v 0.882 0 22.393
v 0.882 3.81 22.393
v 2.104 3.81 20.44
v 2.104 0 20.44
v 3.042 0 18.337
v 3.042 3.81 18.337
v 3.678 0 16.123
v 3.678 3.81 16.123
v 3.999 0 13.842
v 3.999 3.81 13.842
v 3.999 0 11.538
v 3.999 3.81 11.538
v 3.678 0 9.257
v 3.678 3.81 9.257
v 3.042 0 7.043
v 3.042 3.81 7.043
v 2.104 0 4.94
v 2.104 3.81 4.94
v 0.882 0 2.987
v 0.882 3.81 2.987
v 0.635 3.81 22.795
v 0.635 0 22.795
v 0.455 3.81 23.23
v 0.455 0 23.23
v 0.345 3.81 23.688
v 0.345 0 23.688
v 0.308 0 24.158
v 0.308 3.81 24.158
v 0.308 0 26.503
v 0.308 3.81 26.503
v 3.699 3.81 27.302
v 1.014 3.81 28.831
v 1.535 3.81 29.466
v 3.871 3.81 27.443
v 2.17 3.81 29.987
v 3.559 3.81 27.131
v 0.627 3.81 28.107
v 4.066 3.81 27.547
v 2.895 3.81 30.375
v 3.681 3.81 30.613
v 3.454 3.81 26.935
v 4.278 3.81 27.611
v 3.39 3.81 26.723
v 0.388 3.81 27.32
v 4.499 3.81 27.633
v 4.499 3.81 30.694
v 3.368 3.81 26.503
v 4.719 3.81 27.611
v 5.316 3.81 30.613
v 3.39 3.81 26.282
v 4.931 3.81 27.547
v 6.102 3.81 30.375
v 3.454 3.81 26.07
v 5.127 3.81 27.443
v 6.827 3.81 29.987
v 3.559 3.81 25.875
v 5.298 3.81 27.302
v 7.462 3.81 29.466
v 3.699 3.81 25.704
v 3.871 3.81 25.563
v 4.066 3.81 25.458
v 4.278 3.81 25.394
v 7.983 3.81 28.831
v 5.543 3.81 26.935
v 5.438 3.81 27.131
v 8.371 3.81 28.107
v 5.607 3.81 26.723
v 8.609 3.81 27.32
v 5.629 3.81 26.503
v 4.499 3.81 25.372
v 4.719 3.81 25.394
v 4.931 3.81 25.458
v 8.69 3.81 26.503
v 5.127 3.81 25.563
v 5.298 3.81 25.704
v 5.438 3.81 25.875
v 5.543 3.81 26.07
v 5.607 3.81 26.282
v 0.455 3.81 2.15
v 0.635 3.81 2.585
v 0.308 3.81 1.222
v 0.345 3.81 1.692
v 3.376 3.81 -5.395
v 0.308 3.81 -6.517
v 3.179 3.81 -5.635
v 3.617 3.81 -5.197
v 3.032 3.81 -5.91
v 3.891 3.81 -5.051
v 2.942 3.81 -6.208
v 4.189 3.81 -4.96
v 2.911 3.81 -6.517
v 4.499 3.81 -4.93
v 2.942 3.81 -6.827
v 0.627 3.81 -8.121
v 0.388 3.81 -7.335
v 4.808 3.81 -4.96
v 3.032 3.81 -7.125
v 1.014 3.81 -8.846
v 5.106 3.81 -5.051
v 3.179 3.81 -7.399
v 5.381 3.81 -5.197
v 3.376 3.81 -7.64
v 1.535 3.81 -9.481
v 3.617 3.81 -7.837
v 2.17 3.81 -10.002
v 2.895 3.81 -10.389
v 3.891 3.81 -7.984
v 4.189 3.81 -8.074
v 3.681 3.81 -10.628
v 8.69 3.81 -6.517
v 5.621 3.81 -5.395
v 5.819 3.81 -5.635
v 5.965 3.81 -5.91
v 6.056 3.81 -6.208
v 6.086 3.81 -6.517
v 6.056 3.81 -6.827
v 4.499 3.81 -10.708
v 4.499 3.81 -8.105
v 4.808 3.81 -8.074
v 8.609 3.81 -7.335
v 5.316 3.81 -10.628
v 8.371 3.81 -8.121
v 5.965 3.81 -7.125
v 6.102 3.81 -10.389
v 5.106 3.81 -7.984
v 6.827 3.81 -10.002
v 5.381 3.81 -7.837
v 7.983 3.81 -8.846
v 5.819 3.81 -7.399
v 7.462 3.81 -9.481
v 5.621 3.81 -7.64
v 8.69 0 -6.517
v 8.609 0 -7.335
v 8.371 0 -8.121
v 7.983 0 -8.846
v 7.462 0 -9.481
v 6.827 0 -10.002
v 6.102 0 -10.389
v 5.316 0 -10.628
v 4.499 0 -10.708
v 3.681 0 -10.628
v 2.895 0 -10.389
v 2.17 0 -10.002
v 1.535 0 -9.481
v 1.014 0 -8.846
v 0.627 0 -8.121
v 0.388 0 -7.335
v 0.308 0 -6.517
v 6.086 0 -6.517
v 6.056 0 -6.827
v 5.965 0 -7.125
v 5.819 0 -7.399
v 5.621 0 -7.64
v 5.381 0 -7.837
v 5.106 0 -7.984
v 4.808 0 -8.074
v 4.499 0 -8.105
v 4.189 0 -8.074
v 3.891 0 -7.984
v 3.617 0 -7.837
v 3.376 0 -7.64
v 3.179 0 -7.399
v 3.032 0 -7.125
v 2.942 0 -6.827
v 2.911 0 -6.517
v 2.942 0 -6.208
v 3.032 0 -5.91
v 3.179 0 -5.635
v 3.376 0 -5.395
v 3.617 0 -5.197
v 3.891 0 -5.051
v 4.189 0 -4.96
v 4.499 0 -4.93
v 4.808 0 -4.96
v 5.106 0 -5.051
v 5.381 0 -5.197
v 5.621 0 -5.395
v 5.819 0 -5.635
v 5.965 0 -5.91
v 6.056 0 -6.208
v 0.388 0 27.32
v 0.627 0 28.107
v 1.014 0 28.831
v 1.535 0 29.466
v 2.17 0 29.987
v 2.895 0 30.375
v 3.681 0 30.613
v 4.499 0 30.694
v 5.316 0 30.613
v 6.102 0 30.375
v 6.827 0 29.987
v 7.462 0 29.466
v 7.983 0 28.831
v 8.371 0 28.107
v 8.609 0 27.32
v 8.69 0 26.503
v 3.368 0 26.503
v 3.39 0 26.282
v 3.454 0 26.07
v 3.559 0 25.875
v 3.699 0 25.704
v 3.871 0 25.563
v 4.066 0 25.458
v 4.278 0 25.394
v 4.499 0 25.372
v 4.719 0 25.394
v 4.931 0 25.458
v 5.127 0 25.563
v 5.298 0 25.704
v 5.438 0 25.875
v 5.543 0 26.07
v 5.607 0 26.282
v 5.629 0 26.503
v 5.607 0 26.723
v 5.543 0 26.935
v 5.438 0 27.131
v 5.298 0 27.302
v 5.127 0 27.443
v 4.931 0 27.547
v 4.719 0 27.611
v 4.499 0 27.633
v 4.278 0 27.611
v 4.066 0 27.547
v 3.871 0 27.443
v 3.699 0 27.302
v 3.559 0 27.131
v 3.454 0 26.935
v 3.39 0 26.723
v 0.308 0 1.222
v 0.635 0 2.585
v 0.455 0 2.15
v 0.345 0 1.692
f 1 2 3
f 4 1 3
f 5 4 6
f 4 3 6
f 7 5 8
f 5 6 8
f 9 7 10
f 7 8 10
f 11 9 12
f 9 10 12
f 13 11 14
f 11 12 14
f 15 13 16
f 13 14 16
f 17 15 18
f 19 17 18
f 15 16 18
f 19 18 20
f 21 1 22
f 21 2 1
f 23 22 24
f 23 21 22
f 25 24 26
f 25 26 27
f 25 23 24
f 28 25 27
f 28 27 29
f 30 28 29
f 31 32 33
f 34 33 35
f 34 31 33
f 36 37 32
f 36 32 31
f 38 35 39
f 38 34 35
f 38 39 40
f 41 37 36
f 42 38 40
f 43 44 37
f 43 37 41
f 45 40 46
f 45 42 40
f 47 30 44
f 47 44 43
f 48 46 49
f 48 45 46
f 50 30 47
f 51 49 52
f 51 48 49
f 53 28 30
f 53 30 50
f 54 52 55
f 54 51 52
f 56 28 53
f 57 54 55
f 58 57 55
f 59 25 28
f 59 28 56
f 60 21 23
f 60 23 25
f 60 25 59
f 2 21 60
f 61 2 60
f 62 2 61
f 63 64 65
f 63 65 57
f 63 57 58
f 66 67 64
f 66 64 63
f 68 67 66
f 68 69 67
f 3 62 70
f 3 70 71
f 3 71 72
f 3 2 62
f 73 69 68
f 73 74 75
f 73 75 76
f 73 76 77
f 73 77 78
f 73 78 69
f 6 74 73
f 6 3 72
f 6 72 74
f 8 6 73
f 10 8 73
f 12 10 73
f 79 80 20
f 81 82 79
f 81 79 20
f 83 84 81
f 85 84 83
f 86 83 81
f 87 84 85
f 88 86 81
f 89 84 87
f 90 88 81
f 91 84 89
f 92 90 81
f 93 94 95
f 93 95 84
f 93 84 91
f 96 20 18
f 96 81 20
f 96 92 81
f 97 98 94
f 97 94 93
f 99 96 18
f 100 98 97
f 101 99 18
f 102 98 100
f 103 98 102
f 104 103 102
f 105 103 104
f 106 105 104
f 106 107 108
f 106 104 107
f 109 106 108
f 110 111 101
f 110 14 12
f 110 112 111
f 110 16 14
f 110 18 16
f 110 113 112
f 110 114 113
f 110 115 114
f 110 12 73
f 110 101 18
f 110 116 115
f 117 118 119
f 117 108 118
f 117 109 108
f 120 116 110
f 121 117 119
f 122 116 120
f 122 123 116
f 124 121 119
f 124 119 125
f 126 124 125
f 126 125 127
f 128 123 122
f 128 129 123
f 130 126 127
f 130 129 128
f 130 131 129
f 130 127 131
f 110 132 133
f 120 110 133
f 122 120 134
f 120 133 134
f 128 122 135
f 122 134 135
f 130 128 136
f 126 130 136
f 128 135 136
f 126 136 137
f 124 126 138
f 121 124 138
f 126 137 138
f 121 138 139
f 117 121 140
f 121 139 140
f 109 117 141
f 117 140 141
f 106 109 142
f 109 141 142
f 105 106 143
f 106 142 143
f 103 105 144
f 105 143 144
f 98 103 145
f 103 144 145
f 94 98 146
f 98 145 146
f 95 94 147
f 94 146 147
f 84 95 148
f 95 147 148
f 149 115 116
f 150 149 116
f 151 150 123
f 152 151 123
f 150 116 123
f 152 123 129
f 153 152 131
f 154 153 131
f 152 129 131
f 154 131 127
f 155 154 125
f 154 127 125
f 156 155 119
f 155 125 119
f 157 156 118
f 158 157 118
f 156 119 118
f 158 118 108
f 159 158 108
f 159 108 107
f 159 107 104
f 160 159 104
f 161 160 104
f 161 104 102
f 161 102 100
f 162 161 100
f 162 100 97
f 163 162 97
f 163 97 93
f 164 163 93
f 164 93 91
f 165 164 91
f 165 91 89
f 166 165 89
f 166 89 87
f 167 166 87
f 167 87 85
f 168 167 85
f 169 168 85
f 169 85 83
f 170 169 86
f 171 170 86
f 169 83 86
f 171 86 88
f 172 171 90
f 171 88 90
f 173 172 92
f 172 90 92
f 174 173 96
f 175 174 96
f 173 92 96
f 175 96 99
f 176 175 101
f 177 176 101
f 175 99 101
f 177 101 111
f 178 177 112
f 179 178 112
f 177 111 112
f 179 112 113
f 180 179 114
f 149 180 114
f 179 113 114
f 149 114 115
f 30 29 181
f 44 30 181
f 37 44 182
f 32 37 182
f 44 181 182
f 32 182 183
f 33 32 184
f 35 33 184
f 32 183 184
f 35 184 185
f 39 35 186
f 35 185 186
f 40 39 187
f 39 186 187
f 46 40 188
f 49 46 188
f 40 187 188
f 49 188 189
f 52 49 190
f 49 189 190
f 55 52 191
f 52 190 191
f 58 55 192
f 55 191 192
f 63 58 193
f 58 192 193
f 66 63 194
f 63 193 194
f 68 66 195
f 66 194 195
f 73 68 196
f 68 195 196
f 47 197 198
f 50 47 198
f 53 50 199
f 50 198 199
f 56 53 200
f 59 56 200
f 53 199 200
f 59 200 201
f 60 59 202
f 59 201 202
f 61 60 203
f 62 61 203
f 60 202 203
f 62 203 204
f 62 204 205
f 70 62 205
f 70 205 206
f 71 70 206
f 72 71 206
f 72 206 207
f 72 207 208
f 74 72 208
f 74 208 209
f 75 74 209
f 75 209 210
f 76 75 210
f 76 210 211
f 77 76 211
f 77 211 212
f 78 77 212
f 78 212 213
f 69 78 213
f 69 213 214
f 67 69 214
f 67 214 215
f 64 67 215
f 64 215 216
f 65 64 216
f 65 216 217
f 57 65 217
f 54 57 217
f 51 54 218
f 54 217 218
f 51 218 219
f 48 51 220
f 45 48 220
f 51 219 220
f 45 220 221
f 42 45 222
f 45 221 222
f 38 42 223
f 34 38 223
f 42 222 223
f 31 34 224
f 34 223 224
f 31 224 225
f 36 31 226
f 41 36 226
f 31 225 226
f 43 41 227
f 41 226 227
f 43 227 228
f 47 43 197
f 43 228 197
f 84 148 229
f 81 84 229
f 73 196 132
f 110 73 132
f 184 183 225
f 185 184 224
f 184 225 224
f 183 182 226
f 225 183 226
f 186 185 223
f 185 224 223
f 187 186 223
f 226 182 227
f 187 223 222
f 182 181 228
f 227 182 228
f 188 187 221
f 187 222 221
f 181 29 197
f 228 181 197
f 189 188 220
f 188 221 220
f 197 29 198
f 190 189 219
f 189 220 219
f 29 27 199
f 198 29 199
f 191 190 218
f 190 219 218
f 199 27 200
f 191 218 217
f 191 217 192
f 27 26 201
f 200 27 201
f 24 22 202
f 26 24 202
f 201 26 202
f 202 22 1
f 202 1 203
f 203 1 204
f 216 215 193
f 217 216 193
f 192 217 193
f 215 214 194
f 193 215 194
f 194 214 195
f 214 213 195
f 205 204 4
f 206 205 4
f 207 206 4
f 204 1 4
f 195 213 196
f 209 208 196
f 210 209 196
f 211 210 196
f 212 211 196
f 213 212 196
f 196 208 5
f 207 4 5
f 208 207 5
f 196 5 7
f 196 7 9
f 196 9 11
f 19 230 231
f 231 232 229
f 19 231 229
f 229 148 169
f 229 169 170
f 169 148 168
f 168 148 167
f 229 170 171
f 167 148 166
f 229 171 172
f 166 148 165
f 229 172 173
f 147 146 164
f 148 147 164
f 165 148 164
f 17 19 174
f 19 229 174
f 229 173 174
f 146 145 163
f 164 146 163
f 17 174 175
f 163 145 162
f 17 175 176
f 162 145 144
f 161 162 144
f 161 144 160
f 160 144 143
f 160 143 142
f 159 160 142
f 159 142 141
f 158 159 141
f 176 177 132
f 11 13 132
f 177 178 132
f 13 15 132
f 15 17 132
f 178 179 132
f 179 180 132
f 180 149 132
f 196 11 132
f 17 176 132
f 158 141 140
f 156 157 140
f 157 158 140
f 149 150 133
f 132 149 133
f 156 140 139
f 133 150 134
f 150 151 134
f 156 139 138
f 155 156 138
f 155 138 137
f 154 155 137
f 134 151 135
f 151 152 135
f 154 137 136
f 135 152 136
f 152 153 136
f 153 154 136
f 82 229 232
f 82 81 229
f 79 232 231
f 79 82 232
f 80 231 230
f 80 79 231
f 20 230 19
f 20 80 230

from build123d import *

# Parameters (mm, degrees)
BOSS_EXTRUDE1_DEPTH   = 3.81
F_4_40_TAPPED_HOLE1_D = 2.2606
CUT_EXTRUDE1_DEPTH    = 4.81
SKETCH5_R             = 1.5875
CUT_EXTRUDE2_DEPTH    = 4.81
FILLET1_R             = 3


with BuildPart() as part:
    # Sketch1 → Boss-Extrude1 (new body)
    with BuildSketch(Plane(origin=(0, 0, 0), x_dir=(1, 0, 0), z_dir=(0, 1, 0))):
        with BuildLine():
            Line((0.307655172, 6.517241379), (0.307655172, -26.502758621))
            ThreePointArc((0.307655172, -26.502758621), (4.498655172, -30.693758621), (8.689655172, -26.502758621))
            Line((8.689655172, -26.502758621), (8.689655172, 6.517241379))
            ThreePointArc((8.689655172, 6.517241379), (4.498655172, 10.708241379), (0.307655172, 6.517241379))
        make_face()
    extrude(amount=BOSS_EXTRUDE1_DEPTH)

    # #4-40 Tapped Hole1 (through all)
    with Locations(Plane(origin=(0, 3.81, 0), x_dir=(1, 0, 0), z_dir=(0, 1, 0))):
        with Locations((4.498655172, 6.517241379), (4.498655172, -26.502758621)):
            Hole(F_4_40_TAPPED_HOLE1_D / 2)

    # Sketch4 → Cut-Extrude1 (cut, through all)
    with BuildSketch(Plane(origin=(0, 3.81, 0), x_dir=(1, 0, 0), z_dir=(0, 1, 0))):
        with BuildLine():
            Line((-105.054689706, 41.50252919), (-22.868233876, -25.472974727))
            ThreePointArc((-22.868233876, -25.472974727), (0.331829627, -23.107123199), (-2.0340219, 0.092940304))
            Line((-2.0340219, 0.092940304), (-84.220477731, 67.068444221))
            Line((-84.220477731, 67.068444221), (-248.593389391, 201.019452054))
            Line((-248.593389391, 201.019452054), (-269.427601367, 175.453537024))
            Line((-269.427601367, 175.453537024), (-105.054689706, 41.50252919))
        make_face()
    extrude(amount=-CUT_EXTRUDE1_DEPTH, mode=Mode.SUBTRACT)

    # Sketch5 → Cut-Extrude2 (cut, through all)
    with BuildSketch(Plane(origin=(0, 3.81, 0), x_dir=(1, 0, 0), z_dir=(0, 1, 0))):
        with Locations((4.498655172, 6.517241379)):
            Circle(SKETCH5_R)
    extrude(amount=-CUT_EXTRUDE2_DEPTH, mode=Mode.SUBTRACT)

    # Fillet1
    fillet1_edges = [part.edges().sort_by_distance(p)[0] for p in [
        (0.307655172, 1.905, 23.136717878),
        (0.307655172, 1.905, 2.243316545),
    ]]
    fillet(fillet1_edges, radius=FILLET1_R)


solid = part.part
